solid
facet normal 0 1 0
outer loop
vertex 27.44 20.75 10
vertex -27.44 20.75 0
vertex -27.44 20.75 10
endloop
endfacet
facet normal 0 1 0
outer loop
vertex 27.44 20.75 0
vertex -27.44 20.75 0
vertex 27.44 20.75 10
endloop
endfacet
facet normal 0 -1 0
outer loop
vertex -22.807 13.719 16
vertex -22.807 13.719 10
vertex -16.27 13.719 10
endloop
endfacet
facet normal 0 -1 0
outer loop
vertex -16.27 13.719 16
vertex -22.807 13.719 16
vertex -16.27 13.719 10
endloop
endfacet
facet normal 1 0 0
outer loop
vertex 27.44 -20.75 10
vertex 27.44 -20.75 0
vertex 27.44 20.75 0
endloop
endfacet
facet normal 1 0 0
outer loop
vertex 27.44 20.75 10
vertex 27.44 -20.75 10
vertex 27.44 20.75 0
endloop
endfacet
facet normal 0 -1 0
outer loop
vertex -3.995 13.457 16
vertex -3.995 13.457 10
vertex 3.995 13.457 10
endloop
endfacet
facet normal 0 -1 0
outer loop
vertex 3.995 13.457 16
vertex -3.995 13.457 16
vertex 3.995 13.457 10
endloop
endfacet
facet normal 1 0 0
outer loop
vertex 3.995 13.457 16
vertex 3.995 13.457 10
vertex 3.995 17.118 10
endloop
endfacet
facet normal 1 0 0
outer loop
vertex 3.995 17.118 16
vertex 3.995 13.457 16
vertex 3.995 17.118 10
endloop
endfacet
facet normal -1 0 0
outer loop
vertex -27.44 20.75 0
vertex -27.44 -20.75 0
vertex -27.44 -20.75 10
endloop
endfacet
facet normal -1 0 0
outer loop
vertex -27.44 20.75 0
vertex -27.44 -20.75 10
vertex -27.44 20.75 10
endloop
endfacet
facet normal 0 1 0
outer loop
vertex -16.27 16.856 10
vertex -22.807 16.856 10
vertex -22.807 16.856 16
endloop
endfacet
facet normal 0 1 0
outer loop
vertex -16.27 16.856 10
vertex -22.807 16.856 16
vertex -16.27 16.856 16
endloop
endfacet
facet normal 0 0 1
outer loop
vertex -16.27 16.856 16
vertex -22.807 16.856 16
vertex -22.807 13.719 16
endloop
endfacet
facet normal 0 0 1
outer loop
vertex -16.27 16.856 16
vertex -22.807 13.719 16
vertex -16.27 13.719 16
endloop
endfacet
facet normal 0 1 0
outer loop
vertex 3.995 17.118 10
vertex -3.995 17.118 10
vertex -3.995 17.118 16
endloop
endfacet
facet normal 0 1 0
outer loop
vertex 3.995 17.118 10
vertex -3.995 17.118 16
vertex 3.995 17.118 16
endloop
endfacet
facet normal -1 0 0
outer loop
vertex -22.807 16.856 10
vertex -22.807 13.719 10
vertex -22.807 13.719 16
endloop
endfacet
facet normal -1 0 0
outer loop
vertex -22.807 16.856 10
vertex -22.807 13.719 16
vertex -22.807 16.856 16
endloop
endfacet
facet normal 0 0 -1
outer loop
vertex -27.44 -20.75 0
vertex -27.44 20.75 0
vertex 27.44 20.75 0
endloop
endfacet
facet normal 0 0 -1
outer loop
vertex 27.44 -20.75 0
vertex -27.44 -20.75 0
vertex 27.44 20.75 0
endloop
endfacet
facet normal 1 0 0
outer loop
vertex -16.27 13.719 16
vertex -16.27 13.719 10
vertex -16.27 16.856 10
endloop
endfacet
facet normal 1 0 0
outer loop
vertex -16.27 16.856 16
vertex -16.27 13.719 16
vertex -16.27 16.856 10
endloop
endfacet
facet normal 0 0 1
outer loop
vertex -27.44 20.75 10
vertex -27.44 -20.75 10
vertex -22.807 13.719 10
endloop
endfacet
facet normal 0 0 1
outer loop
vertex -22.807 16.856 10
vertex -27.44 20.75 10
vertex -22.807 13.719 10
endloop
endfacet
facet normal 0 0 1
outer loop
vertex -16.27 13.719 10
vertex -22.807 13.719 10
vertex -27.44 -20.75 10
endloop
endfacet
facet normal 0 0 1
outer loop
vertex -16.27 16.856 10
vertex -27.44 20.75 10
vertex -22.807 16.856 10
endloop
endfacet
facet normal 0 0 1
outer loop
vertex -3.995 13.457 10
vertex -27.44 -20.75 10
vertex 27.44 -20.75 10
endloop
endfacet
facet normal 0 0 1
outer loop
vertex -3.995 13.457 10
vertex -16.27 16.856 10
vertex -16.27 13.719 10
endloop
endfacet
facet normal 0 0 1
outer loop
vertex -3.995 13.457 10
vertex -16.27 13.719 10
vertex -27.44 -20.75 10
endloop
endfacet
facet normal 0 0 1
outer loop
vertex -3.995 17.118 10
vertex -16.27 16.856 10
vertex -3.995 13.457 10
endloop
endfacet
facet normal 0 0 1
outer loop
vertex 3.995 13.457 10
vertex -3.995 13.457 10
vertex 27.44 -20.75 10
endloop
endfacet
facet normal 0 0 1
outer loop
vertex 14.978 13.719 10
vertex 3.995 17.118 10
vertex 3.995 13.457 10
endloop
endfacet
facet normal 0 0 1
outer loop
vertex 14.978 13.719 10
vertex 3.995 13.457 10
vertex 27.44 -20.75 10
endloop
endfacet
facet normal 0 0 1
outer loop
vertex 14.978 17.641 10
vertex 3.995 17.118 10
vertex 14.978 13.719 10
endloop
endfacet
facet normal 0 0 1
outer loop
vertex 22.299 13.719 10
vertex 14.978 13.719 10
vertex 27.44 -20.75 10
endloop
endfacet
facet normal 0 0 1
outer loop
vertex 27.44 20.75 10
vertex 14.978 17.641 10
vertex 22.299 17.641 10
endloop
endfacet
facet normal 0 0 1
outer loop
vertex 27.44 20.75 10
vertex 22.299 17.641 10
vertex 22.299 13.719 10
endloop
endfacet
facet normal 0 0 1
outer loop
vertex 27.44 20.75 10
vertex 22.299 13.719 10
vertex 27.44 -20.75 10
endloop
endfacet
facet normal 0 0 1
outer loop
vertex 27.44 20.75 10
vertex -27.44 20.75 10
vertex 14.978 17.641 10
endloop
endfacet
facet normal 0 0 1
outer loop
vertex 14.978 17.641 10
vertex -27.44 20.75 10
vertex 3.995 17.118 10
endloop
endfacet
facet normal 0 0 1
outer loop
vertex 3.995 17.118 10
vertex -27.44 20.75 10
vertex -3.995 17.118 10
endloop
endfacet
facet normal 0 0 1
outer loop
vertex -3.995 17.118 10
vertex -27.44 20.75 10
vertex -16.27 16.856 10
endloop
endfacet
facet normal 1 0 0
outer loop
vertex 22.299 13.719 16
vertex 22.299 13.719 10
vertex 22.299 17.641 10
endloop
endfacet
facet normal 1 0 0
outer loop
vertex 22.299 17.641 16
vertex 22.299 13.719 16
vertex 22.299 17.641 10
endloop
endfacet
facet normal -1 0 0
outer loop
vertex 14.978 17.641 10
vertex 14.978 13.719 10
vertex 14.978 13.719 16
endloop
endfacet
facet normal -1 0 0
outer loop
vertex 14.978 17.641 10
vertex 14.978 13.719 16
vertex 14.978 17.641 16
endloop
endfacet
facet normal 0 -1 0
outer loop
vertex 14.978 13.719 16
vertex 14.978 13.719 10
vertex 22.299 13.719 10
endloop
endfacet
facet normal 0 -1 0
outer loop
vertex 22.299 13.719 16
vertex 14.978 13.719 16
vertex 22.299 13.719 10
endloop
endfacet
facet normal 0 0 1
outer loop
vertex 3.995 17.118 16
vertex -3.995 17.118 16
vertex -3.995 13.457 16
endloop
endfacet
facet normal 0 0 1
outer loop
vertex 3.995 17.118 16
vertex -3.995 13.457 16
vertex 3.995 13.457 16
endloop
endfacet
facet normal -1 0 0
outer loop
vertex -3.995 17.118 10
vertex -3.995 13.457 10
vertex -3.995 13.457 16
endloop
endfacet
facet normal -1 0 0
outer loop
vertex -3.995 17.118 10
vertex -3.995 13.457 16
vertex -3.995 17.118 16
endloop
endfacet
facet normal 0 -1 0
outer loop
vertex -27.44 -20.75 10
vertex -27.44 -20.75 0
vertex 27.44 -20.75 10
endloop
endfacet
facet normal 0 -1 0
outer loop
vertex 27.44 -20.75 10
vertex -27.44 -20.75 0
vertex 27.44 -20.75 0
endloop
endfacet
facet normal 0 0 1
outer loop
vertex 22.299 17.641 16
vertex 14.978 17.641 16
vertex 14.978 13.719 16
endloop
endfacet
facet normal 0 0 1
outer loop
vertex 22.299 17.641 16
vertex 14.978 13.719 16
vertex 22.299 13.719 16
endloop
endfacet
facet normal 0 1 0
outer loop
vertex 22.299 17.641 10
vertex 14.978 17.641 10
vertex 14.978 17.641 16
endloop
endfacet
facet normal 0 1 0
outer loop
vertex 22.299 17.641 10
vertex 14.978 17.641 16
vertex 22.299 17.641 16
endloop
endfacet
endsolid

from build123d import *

# Parameters (mm, degrees)
F0_W     = 54.88
F0_H     = 41.5
F1_DEPTH = 10
F2_W     = 6.537087
F2_H     = 3.137803
F2_W_2   = 7.990626
F2_H_2   = 3.66077
F2_W_3   = 7.32154
F2_H_3   = 3.92225
F3_DEPTH = 6


with BuildPart() as f1:
    # F0 (on Top) → F1 (new body)
    with BuildSketch(Plane.XY):
        Rectangle(F0_W, F0_H)
    extrude(amount=F1_DEPTH)

    # F2 (on face) → F3 (join)
    with BuildSketch(Plane.XY.offset(10)):
        with Locations((-19.538203, 15.287418)):
            Rectangle(F2_W, F2_H)
        with Locations((0, 15.287419)):
            Rectangle(F2_W_2, F2_H_2)
        with Locations((18.638391, 15.679644)):
            Rectangle(F2_W_3, F2_H_3)
    extrude(amount=F3_DEPTH)


solid = f1.part
